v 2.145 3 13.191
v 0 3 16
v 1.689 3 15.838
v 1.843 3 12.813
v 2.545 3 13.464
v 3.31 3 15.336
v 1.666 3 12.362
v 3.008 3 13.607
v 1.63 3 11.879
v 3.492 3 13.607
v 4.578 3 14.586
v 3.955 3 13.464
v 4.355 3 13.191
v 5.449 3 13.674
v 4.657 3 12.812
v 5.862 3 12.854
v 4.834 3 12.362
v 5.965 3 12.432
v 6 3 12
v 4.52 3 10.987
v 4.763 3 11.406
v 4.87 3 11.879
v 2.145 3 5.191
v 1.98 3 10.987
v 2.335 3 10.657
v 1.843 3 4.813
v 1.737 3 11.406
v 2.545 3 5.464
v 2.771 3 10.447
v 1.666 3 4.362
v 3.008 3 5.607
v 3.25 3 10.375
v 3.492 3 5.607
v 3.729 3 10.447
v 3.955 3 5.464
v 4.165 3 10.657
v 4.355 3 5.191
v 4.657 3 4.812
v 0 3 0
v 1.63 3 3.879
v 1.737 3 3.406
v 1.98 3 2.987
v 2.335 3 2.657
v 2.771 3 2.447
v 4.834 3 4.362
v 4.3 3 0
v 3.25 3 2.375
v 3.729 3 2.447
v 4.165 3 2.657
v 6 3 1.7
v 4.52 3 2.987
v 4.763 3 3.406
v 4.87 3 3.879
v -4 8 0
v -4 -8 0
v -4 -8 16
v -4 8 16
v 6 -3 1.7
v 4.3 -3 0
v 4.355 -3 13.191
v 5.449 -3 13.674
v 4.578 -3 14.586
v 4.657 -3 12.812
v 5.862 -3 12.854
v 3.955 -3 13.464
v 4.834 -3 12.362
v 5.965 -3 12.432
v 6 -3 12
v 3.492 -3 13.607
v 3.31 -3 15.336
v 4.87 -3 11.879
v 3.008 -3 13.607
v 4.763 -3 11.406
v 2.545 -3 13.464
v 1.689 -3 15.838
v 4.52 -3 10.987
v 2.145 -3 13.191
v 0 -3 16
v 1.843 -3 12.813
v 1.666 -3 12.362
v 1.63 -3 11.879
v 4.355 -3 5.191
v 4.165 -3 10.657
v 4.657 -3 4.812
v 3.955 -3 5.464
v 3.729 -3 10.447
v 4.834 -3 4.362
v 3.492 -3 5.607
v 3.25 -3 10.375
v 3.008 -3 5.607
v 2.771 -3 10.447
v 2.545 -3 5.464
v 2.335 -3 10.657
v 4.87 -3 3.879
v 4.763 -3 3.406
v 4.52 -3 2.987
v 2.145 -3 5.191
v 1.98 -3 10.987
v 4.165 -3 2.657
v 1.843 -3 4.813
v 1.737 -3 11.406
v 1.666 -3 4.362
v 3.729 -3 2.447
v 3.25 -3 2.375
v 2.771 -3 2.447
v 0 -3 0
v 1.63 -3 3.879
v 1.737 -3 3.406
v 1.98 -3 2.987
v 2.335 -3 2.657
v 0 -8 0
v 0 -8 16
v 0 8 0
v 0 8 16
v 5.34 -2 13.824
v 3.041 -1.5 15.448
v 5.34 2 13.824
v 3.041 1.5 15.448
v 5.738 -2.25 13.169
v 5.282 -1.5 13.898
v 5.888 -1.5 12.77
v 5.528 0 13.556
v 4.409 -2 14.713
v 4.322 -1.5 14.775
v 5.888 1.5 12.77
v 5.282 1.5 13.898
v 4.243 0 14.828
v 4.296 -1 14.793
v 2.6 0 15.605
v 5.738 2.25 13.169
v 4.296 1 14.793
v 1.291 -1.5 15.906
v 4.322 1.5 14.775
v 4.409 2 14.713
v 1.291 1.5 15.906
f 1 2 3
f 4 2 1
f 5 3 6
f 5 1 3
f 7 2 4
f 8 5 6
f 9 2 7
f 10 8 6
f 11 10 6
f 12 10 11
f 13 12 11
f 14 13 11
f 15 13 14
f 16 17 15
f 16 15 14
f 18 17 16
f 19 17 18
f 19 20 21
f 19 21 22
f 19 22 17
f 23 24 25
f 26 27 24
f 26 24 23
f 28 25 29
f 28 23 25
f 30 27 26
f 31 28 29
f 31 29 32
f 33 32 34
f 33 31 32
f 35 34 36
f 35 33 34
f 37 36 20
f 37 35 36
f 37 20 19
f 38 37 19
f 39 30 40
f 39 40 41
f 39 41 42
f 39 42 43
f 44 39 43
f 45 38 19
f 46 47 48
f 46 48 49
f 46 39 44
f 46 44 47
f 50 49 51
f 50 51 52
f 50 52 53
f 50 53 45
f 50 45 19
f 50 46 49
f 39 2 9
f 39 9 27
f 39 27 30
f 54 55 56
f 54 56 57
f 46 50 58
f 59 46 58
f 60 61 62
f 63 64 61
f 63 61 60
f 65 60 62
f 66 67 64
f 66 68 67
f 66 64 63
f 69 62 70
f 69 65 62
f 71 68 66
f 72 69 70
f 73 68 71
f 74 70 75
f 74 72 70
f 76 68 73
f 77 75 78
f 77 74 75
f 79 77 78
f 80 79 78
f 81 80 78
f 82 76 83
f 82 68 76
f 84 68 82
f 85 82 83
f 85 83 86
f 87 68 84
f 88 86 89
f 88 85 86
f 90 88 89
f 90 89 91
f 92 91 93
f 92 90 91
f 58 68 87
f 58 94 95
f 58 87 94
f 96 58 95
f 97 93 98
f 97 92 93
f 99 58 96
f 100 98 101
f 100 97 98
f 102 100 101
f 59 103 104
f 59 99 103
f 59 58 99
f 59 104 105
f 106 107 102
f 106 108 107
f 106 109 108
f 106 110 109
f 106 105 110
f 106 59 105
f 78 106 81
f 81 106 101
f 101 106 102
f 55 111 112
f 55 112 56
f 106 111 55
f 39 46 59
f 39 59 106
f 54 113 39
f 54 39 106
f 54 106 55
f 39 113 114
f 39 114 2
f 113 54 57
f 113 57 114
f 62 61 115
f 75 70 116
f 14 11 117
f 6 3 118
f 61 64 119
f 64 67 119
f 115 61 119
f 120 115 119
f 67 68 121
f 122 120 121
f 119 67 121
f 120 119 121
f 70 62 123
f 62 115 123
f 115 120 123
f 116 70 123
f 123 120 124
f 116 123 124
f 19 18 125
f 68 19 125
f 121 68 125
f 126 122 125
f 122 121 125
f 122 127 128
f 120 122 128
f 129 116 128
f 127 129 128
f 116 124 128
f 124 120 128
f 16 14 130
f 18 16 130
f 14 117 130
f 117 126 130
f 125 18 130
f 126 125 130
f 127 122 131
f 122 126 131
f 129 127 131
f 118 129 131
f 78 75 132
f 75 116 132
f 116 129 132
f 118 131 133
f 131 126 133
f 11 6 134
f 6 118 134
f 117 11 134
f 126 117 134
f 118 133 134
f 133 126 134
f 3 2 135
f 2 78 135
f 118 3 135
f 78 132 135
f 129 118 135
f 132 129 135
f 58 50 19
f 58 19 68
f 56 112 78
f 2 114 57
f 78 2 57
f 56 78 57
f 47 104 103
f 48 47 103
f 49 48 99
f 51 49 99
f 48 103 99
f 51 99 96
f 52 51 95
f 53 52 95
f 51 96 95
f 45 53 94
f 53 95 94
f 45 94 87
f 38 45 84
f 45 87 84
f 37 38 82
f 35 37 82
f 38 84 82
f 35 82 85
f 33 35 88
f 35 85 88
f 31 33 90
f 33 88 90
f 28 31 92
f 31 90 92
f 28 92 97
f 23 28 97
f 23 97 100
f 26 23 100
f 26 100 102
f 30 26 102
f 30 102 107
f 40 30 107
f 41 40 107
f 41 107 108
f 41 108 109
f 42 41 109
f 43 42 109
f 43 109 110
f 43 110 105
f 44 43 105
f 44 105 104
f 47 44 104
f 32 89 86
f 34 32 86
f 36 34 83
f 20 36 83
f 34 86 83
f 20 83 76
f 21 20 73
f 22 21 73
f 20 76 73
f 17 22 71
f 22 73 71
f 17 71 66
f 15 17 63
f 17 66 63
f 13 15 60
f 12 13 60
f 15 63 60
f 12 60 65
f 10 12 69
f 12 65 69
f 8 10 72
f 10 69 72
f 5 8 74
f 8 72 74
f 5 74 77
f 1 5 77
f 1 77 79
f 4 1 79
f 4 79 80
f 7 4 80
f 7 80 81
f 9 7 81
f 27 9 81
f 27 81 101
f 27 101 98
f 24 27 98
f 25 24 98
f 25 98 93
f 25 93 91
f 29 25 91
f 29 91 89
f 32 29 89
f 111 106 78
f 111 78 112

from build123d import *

# Parameters (mm, degrees)
BOSS_EXTRUDE1_DEPTH = 16
SKETCH2_R           = 1.625
CUT_EXTRUDE1_DEPTH  = 21.322401433
CHAMFER1_SIZE       = 1.7
FILLET1_SIZE        = 4
FILLET1_SIZE_2      = 6


with BuildPart() as part:
    # Sketch1 → Boss-Extrude1 (new body)
    with BuildSketch(Plane.XY):
        Polygon((-4, -8), (-4, 8), (0, 8), (0, 3), (6, 3), (6, -3), (0, -3), (0, -8), align=None)
    extrude(amount=BOSS_EXTRUDE1_DEPTH)

    # Sketch2 → Cut-Extrude1 (cut, through all)
    with BuildSketch(Plane.XZ.offset(3)):
        with Locations(Location((3.25, 12, 0), (0, 0, 270))):
            Circle(SKETCH2_R)
        with Locations(Location((3.25, 4, 0), (0, 0, 270))):
            Circle(SKETCH2_R)
    extrude(amount=-CUT_EXTRUDE1_DEPTH, mode=Mode.SUBTRACT)

    # Chamfer1
    chamfer1_edges = [part.edges().sort_by_distance(p)[0] for p in [
        (6, 0, 0),
    ]]
    chamfer(chamfer1_edges, length=CHAMFER1_SIZE)

    # Fillet1
    # an asymmetric fillet: 6, 4 mm, written as the material it takes off along each edge
    with BuildSketch(Plane(origin=(6, 18, 16), x_dir=(0, 0, -1), z_dir=(0, -1, 0))) as fillet1_piece_1:
        with BuildLine():
            Bezier((FILLET1_SIZE, 0), (0, 0), (0, -FILLET1_SIZE_2), weights=[1, 0.707106781, 1])
            Line((0, -FILLET1_SIZE_2), (0, 0))
            Line((0, 0), (FILLET1_SIZE, 0))
        make_face()
    extrude(amount=36, mode=Mode.SUBTRACT)


solid = part.part
